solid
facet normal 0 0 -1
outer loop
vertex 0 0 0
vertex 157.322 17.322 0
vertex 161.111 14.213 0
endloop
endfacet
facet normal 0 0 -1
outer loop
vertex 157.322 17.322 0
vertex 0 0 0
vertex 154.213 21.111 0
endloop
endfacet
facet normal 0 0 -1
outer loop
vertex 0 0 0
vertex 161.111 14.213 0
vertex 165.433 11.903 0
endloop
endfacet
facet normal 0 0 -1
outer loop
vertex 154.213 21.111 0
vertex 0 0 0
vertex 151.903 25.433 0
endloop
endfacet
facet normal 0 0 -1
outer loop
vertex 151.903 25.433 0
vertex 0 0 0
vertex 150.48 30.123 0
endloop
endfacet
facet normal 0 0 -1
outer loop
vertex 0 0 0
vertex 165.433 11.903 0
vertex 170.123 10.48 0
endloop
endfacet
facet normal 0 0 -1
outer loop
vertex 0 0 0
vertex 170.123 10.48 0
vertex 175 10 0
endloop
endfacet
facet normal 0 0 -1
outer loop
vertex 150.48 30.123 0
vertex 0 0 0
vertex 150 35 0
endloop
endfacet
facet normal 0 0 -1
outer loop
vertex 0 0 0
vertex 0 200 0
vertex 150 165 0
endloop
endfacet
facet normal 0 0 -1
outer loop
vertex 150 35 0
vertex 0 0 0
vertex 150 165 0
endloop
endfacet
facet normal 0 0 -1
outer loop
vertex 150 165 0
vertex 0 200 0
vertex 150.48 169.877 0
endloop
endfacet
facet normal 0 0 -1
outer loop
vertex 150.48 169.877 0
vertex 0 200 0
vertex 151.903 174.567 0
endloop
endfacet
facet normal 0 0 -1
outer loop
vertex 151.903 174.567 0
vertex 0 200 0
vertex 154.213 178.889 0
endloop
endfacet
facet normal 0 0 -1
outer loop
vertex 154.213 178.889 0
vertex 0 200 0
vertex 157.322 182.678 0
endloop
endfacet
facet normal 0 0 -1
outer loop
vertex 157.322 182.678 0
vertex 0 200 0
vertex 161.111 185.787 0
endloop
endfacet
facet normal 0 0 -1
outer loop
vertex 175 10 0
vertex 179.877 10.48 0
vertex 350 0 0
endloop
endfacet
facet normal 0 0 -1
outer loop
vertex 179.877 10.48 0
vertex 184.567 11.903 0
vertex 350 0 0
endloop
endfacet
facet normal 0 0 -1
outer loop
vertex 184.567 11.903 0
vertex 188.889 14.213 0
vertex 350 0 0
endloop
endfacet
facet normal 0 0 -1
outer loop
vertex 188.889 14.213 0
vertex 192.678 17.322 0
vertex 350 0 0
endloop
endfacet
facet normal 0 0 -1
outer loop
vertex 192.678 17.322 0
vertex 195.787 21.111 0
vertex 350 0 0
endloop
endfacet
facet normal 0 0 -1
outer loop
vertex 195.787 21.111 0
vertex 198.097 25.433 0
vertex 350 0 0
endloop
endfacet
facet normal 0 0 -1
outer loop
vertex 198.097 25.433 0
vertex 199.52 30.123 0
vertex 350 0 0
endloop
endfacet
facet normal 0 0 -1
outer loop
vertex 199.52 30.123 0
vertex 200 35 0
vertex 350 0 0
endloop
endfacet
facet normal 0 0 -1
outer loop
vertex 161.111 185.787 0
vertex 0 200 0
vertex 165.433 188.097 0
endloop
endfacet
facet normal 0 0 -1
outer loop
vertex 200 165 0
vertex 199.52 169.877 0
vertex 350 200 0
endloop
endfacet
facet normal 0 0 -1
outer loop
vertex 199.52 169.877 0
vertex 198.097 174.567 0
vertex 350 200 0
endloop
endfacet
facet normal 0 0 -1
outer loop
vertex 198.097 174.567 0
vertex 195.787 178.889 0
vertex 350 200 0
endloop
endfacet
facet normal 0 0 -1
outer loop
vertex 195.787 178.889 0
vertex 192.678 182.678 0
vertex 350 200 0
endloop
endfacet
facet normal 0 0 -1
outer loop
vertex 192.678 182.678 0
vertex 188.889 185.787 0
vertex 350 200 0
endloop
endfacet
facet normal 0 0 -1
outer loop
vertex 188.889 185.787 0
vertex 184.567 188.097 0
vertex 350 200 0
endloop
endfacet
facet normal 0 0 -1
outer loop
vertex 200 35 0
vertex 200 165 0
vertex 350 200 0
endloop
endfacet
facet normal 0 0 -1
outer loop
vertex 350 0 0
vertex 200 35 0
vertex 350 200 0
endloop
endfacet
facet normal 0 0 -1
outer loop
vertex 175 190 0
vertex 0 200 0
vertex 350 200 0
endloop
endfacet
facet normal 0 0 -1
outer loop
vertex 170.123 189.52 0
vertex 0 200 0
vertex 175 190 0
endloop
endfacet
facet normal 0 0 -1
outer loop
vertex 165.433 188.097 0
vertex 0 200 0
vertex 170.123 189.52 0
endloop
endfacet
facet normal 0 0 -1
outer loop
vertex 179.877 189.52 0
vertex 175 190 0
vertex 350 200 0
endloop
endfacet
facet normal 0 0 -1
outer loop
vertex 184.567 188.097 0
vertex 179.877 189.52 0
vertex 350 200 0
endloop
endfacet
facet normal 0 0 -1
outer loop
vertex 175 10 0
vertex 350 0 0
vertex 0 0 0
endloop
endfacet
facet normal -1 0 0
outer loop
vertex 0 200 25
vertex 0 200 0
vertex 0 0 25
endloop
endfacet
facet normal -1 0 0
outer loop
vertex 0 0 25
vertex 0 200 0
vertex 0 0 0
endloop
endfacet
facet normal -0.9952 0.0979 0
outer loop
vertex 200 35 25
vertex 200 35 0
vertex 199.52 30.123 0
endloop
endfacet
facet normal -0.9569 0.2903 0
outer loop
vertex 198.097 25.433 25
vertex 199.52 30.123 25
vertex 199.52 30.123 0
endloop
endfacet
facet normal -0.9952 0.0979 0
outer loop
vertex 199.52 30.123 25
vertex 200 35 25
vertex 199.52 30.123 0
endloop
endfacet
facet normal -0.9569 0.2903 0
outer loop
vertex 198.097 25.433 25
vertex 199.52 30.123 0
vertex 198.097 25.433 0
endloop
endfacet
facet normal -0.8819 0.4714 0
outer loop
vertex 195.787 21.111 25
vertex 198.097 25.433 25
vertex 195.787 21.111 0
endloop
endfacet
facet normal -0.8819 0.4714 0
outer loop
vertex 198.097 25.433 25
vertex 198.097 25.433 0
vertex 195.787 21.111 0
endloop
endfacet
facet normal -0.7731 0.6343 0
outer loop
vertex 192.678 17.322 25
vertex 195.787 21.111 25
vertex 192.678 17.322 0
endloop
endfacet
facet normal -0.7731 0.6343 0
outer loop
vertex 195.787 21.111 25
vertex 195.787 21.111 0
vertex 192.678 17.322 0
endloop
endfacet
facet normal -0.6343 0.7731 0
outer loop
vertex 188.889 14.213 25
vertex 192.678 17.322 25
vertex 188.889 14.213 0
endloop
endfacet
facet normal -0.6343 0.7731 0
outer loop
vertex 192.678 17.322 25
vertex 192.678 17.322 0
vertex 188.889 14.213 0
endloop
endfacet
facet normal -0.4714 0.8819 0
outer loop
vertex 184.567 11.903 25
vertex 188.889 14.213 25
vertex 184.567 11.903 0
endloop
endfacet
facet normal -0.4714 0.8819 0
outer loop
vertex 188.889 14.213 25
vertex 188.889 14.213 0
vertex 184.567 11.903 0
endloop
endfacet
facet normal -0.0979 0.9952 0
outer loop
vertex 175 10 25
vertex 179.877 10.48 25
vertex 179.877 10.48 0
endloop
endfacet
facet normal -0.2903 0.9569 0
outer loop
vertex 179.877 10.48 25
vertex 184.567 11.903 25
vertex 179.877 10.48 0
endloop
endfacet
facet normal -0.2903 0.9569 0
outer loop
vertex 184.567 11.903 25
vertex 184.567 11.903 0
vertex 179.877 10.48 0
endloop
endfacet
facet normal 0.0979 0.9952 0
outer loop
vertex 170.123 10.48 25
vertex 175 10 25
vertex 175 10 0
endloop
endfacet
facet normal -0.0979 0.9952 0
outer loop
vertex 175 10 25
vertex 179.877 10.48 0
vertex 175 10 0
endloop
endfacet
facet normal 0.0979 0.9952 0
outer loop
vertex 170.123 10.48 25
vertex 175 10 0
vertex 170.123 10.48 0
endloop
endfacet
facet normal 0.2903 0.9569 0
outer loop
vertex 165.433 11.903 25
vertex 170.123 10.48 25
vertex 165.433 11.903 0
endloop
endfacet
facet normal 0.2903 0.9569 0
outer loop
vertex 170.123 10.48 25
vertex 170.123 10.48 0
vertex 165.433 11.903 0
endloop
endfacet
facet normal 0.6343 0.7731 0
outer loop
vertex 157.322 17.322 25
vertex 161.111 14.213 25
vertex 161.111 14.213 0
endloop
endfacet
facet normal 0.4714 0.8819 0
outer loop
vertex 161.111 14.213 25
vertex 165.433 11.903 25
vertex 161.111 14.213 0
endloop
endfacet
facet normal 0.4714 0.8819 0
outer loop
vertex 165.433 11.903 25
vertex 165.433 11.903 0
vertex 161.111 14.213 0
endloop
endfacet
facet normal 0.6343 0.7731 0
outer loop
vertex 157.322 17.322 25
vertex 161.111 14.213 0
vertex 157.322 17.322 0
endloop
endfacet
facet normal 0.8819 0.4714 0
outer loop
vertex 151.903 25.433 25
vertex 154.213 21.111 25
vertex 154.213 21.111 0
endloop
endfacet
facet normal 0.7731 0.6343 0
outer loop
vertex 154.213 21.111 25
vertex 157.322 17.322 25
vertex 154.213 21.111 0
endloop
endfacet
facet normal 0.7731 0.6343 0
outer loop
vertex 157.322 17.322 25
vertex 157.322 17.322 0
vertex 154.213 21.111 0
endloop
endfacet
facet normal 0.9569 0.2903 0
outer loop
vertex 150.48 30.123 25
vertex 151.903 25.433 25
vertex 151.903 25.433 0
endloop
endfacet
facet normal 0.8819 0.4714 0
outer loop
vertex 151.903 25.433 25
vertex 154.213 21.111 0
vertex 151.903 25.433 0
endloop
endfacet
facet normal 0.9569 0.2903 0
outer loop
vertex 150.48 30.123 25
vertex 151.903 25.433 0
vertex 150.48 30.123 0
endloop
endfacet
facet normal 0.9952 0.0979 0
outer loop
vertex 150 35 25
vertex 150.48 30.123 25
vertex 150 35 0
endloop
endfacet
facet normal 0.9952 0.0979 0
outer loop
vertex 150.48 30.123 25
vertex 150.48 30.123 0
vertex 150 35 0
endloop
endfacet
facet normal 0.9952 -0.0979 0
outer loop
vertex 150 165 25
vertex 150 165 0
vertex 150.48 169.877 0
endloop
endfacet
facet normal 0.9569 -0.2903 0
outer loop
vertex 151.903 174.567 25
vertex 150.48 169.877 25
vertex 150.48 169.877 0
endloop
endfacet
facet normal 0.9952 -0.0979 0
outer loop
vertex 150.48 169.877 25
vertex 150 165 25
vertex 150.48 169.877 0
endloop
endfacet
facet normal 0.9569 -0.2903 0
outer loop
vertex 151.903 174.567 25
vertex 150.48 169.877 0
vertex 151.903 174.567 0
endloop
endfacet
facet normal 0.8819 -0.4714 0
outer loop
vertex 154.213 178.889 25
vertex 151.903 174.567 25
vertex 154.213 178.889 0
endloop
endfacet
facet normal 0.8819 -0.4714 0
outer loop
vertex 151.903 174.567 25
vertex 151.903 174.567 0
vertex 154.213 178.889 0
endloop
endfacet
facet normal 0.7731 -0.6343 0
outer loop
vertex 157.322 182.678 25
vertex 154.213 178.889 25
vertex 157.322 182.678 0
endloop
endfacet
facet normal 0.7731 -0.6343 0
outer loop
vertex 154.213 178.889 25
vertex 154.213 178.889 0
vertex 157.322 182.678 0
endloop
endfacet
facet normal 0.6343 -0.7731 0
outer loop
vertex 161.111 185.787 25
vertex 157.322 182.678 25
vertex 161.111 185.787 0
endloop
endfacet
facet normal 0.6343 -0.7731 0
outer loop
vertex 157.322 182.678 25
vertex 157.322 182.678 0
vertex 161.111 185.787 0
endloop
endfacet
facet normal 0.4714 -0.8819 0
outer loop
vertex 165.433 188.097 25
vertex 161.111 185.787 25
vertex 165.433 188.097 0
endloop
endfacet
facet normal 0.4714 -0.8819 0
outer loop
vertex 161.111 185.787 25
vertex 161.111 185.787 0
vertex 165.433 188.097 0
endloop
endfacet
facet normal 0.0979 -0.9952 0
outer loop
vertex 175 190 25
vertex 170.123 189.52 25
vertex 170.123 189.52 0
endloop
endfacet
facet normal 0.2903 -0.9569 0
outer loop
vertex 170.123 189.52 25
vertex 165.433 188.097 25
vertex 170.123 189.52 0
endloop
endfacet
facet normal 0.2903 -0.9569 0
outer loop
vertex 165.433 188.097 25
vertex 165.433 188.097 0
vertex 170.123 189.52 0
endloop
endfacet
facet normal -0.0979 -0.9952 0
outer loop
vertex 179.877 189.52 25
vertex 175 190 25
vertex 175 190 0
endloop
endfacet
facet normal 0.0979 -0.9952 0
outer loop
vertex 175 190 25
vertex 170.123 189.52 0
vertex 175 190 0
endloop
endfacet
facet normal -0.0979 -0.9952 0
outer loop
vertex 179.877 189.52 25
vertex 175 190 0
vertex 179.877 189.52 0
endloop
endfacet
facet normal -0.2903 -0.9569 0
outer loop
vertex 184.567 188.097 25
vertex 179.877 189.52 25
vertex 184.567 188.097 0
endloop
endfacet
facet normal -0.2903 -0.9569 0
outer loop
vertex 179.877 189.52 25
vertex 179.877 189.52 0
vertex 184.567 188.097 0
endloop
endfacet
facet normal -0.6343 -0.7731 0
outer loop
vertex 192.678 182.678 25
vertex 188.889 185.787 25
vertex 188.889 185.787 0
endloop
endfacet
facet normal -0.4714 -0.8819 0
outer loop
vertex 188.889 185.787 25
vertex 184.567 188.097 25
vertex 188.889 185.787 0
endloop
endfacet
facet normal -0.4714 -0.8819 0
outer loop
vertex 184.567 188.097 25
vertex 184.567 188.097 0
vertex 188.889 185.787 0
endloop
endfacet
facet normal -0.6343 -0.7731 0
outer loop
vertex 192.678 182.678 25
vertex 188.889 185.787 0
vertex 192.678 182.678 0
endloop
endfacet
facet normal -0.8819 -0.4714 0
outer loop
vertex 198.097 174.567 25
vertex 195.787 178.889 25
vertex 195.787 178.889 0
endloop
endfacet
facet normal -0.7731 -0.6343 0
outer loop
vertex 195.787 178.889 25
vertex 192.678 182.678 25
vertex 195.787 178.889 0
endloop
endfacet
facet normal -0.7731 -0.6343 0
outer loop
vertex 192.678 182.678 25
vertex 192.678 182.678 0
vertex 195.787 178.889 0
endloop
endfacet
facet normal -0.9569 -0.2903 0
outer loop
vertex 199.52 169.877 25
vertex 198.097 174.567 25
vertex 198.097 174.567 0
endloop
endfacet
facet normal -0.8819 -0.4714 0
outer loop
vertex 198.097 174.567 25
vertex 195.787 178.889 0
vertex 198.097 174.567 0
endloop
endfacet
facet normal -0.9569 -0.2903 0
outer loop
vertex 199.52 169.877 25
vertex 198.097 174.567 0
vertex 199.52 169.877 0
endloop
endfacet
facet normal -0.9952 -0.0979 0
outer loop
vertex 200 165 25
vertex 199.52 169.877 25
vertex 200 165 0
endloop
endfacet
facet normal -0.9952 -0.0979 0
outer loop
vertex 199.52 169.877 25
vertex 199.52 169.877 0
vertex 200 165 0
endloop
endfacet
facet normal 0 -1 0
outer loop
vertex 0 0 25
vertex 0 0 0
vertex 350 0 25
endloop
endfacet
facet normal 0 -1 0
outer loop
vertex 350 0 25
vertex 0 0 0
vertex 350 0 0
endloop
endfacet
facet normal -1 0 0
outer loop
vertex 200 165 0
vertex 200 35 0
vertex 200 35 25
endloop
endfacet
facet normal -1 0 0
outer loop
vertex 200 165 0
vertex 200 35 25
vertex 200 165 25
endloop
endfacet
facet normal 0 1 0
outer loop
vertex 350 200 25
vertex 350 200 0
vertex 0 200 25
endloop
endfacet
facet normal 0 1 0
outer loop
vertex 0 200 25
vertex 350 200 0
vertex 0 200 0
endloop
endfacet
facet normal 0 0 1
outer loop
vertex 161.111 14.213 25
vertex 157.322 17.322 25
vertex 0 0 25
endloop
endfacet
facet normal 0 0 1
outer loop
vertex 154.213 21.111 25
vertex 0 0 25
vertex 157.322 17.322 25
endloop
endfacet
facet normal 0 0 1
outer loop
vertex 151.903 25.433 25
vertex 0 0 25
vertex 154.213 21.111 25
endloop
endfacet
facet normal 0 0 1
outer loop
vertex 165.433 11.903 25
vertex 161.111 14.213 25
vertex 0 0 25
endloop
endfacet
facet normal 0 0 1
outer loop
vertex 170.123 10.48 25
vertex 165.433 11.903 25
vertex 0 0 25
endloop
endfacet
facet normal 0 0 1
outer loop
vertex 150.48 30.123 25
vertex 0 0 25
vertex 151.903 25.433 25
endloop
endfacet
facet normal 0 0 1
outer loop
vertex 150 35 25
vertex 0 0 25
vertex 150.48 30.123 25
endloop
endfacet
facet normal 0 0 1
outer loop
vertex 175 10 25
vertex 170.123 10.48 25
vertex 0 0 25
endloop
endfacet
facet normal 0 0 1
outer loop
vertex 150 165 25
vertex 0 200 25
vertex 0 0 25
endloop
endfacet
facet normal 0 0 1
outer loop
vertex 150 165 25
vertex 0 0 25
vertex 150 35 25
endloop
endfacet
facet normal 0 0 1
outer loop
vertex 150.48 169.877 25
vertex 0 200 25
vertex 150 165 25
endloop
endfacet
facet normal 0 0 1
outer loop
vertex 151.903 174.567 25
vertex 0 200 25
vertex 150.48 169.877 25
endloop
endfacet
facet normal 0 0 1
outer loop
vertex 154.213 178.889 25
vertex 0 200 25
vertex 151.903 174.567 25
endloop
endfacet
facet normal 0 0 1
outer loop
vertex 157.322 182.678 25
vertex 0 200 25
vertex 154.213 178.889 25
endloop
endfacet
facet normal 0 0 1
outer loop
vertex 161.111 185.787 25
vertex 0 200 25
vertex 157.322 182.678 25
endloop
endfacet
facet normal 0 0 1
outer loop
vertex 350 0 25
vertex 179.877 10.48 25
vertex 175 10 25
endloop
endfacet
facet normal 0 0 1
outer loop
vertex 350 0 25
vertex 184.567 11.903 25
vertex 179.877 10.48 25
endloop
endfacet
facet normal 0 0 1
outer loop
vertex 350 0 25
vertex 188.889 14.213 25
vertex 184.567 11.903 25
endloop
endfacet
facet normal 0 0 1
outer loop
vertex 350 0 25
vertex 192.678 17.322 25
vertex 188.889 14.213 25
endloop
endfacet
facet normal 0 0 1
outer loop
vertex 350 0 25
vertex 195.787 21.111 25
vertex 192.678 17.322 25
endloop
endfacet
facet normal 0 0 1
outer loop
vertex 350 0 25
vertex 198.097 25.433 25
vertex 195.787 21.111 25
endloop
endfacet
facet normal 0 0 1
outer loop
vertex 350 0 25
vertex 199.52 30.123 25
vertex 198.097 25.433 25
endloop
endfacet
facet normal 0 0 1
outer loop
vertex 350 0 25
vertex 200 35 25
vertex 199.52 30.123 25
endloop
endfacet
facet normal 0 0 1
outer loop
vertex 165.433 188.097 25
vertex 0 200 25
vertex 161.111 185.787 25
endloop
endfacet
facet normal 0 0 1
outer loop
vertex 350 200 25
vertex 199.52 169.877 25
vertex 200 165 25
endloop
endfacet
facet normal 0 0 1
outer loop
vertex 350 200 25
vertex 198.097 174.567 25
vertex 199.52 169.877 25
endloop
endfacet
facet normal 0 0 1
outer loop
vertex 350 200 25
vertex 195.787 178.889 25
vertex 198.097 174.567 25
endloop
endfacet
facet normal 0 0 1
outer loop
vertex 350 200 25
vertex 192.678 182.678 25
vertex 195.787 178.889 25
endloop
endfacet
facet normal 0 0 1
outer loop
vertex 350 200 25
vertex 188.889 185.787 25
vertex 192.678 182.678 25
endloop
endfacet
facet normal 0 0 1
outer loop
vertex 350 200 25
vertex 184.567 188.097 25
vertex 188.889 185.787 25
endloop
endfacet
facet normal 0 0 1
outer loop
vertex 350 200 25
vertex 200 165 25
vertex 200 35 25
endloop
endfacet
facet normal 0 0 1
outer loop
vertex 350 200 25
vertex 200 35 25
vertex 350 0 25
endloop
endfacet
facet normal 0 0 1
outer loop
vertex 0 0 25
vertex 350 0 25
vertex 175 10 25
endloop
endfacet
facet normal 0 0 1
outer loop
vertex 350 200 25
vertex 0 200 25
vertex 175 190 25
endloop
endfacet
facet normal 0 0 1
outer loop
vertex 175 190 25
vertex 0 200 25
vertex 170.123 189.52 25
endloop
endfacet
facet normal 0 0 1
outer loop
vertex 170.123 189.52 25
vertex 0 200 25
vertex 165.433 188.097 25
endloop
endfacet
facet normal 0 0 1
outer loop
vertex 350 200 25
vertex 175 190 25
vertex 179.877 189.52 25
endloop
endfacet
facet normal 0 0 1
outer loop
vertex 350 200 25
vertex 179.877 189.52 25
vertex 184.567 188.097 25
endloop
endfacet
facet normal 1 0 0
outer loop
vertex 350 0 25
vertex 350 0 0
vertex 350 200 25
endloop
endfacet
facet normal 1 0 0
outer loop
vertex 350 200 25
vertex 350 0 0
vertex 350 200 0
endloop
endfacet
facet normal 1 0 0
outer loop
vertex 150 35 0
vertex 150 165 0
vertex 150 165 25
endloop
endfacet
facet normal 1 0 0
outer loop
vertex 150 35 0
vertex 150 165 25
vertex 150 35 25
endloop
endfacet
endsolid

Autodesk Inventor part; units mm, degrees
ref_plane "YZ Plane" through (0, 0, 0) normal (1, 0, 0) x (0, 1, 0)
ref_plane "XZ Plane" through (0, 0, 0) normal (0, 1, 0) x (-1, 0, 0)
ref_plane "XY Plane" through (0, 0, 0) normal (0, 0, 1) x (1, 0, 0)
sketch "Sketch1" plane through (0, 0, 0) normal (0, 0, 1) x (1, 0, 0)
  line L0 (0, 0) -> (350, 0)
  line L1 (350, 0) -> (350, 200)
  line L2 (350, 200) -> (0, 200)
  line L3 (0, 200) -> (0, 0)
  line L4 (175, 165) -> (175, 35) construction
  line L5 (150, 165) -> (150, 35)
  line L6 (200, 35) -> (200, 165)
  arc A0 (200, 165) -> (150, 165) centre (175, 165) ccw
  arc A1 (150, 35) -> (200, 35) centre (175, 35) ccw
  point P0 (175, 100)
  dimension "d6" = 175
  dimension "d7" = 130
extrude "Extrusion1" add sketch "Sketch1" along normal blind 25
properties part number "disk plate"
